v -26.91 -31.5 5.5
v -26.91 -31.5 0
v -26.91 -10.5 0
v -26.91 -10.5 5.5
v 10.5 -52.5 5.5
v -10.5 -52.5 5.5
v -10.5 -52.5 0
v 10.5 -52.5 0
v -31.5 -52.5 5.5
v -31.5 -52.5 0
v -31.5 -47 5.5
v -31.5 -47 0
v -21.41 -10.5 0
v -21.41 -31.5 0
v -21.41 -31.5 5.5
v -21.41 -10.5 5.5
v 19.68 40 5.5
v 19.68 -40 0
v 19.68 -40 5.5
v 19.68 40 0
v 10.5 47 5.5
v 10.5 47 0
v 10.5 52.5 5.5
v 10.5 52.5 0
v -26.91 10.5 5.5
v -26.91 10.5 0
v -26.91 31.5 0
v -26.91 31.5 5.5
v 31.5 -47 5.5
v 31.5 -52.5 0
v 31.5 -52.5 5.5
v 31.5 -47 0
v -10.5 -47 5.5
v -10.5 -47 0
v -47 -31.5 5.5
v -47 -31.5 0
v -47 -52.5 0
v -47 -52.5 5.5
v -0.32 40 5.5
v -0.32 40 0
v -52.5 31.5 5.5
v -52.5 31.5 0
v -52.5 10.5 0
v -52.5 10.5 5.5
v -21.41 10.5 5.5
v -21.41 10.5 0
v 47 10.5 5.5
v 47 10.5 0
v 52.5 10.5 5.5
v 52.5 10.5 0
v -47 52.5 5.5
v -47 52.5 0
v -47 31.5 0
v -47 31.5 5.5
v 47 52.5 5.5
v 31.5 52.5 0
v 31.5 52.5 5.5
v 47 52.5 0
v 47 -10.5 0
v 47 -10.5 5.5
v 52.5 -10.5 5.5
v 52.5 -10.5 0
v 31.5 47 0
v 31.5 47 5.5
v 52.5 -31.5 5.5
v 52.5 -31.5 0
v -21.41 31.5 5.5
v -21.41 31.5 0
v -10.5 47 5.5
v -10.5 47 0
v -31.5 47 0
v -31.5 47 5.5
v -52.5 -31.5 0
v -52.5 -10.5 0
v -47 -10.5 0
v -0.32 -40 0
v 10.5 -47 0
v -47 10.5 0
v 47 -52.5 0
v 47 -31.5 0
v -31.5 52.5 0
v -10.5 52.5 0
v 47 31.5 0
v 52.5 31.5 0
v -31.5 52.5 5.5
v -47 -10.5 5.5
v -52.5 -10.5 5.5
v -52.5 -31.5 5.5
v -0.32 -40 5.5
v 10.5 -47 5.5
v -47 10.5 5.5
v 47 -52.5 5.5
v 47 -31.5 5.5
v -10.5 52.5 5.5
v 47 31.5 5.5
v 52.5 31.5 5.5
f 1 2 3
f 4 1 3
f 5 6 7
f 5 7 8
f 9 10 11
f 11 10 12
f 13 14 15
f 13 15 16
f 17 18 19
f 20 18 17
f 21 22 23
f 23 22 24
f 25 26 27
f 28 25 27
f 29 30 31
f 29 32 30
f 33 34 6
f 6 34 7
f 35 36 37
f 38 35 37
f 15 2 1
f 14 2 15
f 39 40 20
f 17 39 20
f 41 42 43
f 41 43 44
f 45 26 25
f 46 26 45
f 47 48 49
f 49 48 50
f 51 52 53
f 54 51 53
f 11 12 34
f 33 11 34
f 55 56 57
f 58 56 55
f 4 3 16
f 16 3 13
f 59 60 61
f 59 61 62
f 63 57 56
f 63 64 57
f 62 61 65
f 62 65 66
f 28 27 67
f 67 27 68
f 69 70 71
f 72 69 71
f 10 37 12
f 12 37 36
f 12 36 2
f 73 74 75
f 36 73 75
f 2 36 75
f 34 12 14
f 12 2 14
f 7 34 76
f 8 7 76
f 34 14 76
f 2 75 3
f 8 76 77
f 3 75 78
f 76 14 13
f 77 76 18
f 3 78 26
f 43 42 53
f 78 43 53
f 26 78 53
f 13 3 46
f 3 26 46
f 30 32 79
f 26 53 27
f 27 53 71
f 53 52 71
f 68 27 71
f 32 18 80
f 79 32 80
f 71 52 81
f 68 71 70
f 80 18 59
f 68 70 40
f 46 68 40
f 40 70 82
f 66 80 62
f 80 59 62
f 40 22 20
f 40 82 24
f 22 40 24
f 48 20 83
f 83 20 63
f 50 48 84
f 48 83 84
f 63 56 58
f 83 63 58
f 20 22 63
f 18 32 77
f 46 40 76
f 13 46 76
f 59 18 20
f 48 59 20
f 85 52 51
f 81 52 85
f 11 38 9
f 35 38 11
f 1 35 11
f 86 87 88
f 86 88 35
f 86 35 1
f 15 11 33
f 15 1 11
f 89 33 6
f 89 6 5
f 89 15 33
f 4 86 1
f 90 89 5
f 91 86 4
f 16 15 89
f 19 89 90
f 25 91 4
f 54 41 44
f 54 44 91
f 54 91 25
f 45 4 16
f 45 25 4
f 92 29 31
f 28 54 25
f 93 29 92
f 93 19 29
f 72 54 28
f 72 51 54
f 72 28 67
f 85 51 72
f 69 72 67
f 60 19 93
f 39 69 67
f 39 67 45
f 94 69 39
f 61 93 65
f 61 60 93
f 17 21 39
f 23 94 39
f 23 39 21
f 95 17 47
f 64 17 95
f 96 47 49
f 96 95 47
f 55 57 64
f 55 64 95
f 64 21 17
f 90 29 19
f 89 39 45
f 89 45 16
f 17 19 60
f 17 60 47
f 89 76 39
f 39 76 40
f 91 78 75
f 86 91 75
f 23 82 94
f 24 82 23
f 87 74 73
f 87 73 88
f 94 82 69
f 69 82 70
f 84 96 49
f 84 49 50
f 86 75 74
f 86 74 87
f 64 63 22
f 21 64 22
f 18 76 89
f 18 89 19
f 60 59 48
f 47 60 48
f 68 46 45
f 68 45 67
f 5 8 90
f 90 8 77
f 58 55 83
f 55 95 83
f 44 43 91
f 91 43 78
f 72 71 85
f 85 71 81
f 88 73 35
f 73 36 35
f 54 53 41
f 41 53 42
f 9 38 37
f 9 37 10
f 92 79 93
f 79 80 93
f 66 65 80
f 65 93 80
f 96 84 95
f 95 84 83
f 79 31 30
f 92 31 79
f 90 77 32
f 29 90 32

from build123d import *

# Parameters (mm, degrees)
CROQUIS2_W              = 20
CROQUIS2_H              = 80
CROQUIS2_W_2            = 5.5
CROQUIS2_H_2            = 21
SALIENTE_EXTRUIR1_DEPTH = 5.5
CROQUIS3_W              = 5.5
CROQUIS3_H              = 21
SALIENTE_EXTRUIR2_DEPTH = 2.5
CROQUIS4_W              = 15.5
CROQUIS4_H              = 5.5
CROQUIS4_W_2            = 21
SALIENTE_EXTRUIR3_DEPTH = 2.5
CROQUIS5_W              = 5.5
CROQUIS5_H              = 21
SALIENTE_EXTRUIR4_DEPTH = 2.5
CROQUIS6_W              = 15.5
CROQUIS6_H              = 5.5
CROQUIS6_W_2            = 21
SALIENTE_EXTRUIR5_DEPTH = 2.5


with BuildPart() as part:
    # Croquis2 → Saliente-Extruir1 (new body)
    with BuildSketch(Plane.XY):
        Polygon((-47, 50), (-47, 31.5), (-50, 31.5), (-50, 10.5), (-47, 10.5), (-47, -10.5), (-50, -10.5), (-50, -31.5), (-47, -31.5), (-47, -50), (-31.5, -50), (-31.5, -47), (-10.5, -47), (-10.5, -50), (10.5, -50), (10.5, -47), (31.5, -47), (31.5, -50), (47, -50), (47, -31.5), (50, -31.5), (50, -10.5), (47, -10.5), (47, 10.5), (50, 10.5), (50, 31.5), (47, 31.5), (47, 50), (31.5, 50), (31.5, 47), (10.5, 47), (10.5, 50), (-10.5, 50), (-10.5, 47), (-31.5, 47), (-31.5, 50), align=None)
        with Locations((9.68, 0)):
            Rectangle(CROQUIS2_W, CROQUIS2_H, mode=Mode.SUBTRACT)
        with Locations((-24.16, 21)):
            Rectangle(CROQUIS2_W_2, CROQUIS2_H_2, mode=Mode.SUBTRACT)
        with Locations((-24.16, -21)):
            Rectangle(CROQUIS2_W_2, CROQUIS2_H_2, mode=Mode.SUBTRACT)
    extrude(amount=SALIENTE_EXTRUIR1_DEPTH)

    # Croquis3 → Saliente-Extruir2 (add)
    with BuildSketch(Plane.ZY.offset(50)):
        with Locations((2.75, -21)):
            Rectangle(CROQUIS3_W, CROQUIS3_H)
        with Locations((2.75, 21)):
            Rectangle(CROQUIS3_W, CROQUIS3_H)
    extrude(amount=SALIENTE_EXTRUIR2_DEPTH)

    # Croquis4 → Saliente-Extruir3 (add)
    with BuildSketch(Plane(origin=(0, 50, 0), x_dir=(1, 0, 0), z_dir=(0, 1, 0))):
        with Locations((39.25, -2.75)):
            Rectangle(CROQUIS4_W, CROQUIS4_H)
        with Locations((0, -2.75)):
            Rectangle(CROQUIS4_W_2, CROQUIS4_H)
        with Locations((-39.25, -2.75)):
            Rectangle(CROQUIS4_W, CROQUIS4_H)
    extrude(amount=SALIENTE_EXTRUIR3_DEPTH)

    # Croquis5 → Saliente-Extruir4 (add)
    with BuildSketch(Plane(origin=(50, 0, 0), x_dir=(0, 0, -1), z_dir=(1, 0, 0))):
        with Locations((-2.75, -21)):
            Rectangle(CROQUIS5_W, CROQUIS5_H)
        with Locations((-2.75, 21)):
            Rectangle(CROQUIS5_W, CROQUIS5_H)
    extrude(amount=SALIENTE_EXTRUIR4_DEPTH)

    # Croquis6 → Saliente-Extruir5 (add)
    with BuildSketch(Plane.XZ.offset(50)):
        with Locations((39.25, 2.75)):
            Rectangle(CROQUIS6_W, CROQUIS6_H)
        with Locations((0, 2.75)):
            Rectangle(CROQUIS6_W_2, CROQUIS6_H)
        with Locations((-39.25, 2.75)):
            Rectangle(CROQUIS6_W, CROQUIS6_H)
    extrude(amount=SALIENTE_EXTRUIR5_DEPTH)


solid = part.part
